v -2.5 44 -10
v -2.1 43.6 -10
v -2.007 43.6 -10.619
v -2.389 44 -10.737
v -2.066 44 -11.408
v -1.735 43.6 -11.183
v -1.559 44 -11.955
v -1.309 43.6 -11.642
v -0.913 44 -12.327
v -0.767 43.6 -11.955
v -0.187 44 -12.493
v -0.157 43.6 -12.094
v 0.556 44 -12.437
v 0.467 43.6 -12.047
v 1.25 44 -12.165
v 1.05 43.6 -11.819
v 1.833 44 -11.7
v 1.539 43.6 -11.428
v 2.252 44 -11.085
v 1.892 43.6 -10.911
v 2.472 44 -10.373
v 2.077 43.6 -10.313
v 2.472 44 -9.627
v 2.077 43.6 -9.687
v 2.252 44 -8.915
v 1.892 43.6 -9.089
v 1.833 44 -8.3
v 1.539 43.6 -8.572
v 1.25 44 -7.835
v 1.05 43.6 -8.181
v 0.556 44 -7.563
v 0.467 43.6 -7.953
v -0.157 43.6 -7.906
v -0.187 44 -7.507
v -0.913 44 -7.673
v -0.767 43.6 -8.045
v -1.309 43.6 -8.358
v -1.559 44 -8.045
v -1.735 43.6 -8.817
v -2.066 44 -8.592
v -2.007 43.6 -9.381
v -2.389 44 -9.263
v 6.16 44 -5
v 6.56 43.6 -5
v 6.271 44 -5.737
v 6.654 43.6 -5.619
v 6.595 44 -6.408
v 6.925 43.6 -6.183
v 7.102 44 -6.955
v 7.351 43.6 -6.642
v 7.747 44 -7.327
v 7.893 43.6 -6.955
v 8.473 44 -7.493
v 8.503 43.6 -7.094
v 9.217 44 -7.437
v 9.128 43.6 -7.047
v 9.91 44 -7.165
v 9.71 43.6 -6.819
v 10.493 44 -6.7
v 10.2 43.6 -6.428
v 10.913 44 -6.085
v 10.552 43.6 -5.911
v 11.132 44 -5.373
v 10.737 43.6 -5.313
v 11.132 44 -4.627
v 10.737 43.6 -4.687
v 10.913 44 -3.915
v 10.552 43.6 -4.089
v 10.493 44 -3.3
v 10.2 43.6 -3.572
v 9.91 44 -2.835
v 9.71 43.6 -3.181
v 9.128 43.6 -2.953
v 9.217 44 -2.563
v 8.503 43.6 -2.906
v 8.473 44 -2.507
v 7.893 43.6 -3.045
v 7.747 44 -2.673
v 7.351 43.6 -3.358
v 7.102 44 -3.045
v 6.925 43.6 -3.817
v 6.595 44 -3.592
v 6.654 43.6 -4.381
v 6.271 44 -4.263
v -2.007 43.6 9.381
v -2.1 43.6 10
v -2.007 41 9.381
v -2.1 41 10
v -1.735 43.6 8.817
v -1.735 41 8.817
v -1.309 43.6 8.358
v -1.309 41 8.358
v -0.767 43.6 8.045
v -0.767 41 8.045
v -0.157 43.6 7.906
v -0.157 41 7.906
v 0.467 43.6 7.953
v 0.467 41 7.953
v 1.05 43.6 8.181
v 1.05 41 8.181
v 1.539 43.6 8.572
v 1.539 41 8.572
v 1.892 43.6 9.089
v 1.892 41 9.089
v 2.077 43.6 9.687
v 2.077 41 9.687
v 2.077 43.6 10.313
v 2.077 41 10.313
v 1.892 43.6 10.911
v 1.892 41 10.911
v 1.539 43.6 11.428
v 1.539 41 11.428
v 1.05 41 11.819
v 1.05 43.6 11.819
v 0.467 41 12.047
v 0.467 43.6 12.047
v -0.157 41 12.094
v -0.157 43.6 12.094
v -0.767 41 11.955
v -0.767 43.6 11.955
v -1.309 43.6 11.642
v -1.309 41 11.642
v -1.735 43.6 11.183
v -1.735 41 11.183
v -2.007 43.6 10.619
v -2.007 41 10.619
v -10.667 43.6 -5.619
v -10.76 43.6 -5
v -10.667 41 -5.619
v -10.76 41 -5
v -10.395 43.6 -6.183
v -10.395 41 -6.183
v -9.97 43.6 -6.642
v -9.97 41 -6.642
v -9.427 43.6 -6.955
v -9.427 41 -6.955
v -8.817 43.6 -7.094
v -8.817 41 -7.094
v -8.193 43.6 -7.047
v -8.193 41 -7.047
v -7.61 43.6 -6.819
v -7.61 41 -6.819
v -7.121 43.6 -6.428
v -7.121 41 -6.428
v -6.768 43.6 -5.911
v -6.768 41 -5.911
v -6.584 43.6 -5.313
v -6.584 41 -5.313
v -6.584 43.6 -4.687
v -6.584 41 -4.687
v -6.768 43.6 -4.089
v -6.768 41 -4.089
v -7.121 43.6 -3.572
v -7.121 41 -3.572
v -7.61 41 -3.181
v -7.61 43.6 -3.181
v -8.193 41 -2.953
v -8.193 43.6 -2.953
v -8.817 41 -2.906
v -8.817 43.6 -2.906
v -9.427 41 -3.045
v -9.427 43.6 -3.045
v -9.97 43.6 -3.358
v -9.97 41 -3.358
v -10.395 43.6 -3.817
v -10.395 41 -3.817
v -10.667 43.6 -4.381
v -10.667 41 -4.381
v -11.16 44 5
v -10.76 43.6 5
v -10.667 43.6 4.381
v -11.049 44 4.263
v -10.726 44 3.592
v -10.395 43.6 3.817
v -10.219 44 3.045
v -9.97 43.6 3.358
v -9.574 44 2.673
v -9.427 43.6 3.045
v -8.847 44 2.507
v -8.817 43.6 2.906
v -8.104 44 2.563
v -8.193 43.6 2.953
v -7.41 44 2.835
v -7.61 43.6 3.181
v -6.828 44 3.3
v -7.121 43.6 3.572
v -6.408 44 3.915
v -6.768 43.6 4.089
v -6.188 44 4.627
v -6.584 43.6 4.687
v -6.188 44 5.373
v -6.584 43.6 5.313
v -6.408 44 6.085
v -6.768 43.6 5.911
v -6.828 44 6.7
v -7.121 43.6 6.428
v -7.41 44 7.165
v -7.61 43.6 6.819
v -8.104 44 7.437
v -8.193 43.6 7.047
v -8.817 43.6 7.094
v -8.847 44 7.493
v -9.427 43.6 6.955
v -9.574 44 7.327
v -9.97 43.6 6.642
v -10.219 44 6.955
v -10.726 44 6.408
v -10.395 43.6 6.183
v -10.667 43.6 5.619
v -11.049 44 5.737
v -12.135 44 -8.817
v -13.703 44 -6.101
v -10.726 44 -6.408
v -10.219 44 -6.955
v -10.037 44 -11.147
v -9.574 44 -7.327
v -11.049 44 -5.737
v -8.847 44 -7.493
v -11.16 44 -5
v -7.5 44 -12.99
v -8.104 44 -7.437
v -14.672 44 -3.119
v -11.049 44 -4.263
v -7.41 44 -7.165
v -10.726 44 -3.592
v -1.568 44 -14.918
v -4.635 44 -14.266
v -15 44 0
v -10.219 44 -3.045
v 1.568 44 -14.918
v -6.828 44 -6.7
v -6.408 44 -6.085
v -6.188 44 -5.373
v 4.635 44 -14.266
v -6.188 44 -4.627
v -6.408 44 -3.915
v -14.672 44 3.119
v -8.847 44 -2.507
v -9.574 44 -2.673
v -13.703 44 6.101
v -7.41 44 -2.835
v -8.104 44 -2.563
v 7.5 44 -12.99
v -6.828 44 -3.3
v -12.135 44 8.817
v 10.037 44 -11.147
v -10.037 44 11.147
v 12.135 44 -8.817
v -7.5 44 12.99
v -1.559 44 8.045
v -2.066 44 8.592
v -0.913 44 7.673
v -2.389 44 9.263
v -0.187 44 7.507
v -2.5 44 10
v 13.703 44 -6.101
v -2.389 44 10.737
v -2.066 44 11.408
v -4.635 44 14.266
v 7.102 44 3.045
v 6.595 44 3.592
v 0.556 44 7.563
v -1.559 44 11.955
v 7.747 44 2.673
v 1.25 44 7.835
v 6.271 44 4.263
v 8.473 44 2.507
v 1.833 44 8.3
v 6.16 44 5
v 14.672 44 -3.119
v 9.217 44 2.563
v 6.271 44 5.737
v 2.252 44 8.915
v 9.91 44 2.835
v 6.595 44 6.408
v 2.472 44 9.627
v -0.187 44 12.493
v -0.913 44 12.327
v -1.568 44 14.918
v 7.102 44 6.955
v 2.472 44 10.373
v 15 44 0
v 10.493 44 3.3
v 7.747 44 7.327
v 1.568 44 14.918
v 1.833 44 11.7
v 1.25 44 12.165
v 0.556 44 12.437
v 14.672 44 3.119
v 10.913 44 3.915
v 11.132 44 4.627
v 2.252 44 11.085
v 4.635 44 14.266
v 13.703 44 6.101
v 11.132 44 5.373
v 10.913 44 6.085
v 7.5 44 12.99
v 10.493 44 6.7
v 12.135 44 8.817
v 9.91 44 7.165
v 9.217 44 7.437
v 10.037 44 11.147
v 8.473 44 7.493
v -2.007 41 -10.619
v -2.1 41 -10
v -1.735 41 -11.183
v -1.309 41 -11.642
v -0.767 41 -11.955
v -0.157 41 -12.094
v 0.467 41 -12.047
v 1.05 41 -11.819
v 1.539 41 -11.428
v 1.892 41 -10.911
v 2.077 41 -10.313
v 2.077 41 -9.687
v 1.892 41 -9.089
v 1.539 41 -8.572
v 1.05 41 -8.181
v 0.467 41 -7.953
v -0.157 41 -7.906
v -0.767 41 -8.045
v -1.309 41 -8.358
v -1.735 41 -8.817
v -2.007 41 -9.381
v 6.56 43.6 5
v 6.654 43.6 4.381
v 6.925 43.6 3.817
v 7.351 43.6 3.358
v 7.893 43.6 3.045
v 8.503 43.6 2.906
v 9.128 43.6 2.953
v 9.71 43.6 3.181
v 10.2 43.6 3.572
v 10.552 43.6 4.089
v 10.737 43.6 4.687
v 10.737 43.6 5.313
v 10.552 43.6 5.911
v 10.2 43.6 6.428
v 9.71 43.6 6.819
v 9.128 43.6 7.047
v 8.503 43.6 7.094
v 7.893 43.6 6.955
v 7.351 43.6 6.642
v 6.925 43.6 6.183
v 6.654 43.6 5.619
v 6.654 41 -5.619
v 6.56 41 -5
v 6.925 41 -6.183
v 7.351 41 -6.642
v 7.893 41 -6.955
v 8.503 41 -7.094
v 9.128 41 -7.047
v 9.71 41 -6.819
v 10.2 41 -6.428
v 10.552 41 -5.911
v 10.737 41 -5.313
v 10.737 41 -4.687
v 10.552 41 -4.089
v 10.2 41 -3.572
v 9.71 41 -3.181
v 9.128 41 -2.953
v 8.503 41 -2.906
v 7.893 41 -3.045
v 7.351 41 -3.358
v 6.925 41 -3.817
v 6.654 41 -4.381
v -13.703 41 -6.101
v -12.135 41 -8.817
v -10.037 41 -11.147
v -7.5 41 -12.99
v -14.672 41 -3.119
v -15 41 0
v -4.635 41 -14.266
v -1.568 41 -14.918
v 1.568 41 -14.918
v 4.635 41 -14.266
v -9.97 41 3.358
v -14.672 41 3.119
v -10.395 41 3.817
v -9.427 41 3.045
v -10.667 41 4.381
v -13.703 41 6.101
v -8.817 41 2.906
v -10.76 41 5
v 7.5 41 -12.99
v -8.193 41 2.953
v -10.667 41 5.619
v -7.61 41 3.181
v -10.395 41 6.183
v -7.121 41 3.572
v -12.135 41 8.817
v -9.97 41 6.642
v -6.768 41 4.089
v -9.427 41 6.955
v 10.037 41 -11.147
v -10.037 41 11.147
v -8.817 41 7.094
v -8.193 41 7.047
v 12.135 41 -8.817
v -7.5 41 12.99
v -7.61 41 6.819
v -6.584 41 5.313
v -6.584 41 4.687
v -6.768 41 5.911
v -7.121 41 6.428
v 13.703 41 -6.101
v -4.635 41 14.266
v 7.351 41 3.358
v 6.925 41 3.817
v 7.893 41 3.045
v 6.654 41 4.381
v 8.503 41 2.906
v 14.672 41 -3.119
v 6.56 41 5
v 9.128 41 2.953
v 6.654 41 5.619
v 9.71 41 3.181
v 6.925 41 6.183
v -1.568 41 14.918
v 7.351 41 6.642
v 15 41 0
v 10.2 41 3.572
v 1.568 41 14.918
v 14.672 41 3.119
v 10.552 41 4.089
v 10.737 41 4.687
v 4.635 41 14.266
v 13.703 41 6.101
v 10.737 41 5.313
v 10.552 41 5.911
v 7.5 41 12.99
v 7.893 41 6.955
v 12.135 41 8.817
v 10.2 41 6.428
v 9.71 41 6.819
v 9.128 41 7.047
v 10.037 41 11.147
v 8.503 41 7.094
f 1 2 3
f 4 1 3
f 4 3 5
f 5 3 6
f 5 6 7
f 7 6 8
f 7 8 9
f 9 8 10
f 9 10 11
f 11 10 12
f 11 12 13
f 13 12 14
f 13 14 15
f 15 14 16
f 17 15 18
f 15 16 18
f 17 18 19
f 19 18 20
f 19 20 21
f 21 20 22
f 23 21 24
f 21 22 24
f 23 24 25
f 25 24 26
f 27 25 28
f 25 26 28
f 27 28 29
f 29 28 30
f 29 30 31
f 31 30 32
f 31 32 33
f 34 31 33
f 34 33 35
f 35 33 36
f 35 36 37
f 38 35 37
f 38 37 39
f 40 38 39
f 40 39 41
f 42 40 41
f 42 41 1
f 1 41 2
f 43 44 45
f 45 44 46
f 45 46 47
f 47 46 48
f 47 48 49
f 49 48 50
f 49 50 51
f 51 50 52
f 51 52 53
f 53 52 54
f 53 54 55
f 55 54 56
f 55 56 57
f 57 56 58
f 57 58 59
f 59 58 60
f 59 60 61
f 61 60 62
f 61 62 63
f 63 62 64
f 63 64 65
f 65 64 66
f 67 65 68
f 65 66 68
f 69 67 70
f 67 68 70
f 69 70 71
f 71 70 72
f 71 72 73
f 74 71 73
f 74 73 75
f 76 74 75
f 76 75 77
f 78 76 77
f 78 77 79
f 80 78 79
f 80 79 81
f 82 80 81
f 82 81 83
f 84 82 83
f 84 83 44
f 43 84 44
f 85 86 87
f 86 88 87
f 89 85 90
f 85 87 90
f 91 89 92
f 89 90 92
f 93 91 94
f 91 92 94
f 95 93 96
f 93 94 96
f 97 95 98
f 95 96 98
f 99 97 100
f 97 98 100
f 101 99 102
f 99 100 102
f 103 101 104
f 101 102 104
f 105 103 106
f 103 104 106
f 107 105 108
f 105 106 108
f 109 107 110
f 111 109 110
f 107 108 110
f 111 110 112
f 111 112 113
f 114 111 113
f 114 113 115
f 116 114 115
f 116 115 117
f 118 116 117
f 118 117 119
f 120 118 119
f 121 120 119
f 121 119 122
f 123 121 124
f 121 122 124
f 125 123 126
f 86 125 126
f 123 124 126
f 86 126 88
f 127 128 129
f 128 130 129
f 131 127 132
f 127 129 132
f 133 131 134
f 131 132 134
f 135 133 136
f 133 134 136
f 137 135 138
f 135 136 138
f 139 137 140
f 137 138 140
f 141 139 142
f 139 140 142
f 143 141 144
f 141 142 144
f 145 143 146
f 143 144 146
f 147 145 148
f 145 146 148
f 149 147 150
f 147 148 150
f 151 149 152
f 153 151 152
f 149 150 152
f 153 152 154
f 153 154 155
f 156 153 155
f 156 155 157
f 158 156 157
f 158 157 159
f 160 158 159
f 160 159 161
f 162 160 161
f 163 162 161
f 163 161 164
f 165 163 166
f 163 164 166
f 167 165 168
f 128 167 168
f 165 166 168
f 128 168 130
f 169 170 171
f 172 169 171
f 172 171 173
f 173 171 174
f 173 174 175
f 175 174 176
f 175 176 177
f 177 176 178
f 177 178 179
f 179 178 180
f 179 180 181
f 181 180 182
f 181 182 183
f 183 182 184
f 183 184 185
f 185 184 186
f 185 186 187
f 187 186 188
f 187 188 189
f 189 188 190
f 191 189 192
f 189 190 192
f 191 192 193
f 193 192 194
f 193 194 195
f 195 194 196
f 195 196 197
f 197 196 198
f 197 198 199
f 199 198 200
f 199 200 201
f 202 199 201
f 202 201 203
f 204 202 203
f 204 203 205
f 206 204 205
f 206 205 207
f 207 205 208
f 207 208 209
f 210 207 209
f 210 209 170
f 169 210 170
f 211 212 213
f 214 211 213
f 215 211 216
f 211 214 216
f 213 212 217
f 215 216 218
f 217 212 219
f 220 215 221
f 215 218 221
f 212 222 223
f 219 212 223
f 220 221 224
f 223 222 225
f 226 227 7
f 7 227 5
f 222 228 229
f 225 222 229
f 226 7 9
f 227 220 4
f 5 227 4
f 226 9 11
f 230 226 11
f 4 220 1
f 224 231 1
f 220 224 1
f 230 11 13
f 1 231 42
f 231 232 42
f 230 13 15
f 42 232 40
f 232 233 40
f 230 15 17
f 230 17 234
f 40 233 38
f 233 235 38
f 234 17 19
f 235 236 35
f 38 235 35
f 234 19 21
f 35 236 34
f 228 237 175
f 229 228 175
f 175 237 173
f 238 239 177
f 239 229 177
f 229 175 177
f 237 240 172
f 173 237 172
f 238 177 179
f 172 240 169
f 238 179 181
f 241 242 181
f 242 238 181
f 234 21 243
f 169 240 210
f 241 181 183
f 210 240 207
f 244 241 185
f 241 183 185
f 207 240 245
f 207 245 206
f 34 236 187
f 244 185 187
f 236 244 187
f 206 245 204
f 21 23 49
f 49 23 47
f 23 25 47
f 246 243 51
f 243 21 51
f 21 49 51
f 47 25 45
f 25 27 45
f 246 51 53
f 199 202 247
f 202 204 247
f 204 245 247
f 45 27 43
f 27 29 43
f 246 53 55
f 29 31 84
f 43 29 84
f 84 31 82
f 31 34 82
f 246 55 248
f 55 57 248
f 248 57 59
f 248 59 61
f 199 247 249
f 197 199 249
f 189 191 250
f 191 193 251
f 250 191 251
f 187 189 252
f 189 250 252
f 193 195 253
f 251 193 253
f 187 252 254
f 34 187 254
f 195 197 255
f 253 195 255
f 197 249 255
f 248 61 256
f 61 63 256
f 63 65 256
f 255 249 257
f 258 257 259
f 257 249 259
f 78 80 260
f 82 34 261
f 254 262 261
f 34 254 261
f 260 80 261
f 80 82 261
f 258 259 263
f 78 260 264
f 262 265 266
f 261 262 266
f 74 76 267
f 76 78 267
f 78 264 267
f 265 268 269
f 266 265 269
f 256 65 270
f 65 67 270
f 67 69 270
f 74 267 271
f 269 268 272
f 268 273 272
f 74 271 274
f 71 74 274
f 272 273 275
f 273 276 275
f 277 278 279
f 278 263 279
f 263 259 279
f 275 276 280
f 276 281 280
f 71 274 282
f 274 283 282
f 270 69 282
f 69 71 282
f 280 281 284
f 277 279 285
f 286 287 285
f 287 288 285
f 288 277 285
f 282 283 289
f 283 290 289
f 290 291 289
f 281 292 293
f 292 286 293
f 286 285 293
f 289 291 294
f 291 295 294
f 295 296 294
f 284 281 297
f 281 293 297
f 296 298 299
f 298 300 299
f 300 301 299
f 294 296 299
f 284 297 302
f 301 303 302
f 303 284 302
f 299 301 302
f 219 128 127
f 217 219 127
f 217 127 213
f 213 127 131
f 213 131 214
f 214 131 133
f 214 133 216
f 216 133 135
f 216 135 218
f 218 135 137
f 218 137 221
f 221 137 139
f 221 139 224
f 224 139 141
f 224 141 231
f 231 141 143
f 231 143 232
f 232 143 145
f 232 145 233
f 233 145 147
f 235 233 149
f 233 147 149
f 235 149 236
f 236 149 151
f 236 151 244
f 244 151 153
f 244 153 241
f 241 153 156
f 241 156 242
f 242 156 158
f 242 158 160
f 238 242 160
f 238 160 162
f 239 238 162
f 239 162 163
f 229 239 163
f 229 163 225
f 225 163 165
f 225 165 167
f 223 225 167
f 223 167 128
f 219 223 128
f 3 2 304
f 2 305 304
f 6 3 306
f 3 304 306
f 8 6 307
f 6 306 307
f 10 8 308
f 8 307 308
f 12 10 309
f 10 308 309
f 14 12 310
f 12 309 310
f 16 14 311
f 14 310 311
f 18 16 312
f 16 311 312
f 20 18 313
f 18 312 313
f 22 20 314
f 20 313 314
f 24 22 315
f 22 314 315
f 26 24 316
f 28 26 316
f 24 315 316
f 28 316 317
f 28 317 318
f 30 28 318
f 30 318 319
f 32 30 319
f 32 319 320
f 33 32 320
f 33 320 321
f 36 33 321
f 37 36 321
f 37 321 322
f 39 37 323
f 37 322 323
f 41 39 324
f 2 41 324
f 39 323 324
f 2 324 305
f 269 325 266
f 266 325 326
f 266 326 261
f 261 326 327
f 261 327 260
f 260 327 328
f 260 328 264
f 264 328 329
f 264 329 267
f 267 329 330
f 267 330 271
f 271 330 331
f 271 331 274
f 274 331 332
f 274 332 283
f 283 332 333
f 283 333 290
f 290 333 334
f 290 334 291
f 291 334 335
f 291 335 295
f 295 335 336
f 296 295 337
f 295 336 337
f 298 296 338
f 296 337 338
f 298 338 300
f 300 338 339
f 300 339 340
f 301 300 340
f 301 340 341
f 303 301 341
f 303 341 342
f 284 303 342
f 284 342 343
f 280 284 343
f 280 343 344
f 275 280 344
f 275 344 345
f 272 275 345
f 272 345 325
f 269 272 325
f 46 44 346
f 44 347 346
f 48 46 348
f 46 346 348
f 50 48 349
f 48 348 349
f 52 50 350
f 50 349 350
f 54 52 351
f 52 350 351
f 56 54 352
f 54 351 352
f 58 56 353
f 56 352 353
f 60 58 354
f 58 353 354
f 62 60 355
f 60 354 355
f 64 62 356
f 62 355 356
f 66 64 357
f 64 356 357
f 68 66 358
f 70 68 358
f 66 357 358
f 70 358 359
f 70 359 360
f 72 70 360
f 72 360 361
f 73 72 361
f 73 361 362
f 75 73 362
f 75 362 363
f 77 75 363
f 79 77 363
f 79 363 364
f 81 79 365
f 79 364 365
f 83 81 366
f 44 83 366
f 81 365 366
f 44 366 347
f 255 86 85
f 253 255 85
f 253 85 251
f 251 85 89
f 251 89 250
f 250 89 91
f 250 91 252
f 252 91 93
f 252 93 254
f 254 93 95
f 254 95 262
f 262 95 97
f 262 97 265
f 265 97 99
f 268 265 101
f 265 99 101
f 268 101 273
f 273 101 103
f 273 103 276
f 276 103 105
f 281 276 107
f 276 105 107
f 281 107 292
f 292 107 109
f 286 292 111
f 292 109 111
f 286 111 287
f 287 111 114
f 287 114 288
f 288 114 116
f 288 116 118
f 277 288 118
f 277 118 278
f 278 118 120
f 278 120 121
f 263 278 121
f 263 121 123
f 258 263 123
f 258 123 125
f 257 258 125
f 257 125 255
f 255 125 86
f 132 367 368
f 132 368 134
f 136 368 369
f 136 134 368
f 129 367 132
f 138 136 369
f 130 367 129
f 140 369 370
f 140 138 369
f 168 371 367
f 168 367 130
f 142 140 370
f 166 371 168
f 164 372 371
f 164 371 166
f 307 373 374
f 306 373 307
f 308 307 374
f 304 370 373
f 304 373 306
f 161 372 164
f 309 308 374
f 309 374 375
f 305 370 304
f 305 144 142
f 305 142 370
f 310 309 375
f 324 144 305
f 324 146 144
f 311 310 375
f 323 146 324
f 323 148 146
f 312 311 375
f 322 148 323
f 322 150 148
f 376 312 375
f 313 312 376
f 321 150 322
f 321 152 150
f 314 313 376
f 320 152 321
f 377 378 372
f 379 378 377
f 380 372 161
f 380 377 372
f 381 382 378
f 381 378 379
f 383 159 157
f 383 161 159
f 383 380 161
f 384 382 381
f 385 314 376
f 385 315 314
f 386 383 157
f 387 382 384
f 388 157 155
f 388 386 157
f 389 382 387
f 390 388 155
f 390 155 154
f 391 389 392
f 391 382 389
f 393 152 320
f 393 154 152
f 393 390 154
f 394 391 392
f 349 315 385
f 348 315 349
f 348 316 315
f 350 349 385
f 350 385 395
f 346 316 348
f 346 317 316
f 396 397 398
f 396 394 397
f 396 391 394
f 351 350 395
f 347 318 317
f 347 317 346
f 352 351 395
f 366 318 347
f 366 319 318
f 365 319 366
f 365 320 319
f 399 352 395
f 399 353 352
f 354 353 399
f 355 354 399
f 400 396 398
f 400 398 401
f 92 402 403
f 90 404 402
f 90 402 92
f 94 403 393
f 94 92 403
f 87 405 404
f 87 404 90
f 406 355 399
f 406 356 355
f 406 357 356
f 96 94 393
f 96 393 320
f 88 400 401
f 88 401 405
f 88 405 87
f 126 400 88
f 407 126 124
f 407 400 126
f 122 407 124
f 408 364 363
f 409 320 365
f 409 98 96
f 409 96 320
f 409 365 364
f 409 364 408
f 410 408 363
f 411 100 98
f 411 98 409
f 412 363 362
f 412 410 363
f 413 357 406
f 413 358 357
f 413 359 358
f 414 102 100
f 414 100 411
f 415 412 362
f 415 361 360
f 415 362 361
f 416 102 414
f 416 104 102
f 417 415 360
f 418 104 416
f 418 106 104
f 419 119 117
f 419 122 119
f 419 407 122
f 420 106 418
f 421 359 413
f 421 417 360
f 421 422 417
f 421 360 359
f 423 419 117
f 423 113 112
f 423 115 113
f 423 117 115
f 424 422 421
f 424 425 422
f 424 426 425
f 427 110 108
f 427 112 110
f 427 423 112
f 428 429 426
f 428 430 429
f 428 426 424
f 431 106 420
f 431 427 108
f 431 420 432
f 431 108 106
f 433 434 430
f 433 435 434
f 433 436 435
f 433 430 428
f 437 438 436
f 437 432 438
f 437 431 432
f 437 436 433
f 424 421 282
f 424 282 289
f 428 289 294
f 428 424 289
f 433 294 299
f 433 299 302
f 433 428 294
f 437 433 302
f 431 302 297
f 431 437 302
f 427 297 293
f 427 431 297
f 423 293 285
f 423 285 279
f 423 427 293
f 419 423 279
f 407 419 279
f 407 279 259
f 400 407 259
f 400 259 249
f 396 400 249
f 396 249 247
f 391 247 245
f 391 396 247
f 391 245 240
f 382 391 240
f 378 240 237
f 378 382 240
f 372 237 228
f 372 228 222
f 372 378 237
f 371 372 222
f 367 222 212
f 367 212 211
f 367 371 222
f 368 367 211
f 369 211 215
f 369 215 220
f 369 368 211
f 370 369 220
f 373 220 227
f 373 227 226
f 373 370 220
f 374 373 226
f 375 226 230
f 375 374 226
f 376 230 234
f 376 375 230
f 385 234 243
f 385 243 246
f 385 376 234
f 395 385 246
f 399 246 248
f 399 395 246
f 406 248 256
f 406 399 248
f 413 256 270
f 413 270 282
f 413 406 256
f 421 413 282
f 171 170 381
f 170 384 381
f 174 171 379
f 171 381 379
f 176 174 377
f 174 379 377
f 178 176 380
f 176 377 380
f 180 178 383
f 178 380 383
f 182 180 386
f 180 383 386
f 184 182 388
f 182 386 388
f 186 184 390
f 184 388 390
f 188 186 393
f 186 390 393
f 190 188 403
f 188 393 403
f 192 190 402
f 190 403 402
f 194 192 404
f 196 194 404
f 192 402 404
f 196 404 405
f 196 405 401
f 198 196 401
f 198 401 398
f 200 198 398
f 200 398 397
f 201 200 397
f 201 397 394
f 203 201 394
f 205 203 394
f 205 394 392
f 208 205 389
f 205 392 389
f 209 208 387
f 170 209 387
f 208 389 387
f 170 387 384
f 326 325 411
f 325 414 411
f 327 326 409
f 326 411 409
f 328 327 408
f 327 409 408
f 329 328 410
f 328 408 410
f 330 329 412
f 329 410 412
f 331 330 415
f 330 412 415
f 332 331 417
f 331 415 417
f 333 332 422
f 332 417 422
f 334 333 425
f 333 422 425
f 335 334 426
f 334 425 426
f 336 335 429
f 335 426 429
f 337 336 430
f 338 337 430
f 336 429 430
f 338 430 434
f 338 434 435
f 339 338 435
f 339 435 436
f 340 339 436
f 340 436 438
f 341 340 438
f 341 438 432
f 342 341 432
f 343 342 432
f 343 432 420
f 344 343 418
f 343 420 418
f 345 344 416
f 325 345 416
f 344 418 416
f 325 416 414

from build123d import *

# Parameters (mm, degrees)
SKETCH_1_R                  = 15
EXTRUDE_1_DEPTH             = 3
HOLE_WIZARD_M41_D           = 4.2
HOLE_WIZARD_M41_CSINK_D     = 5
HOLE_WIZARD_M41_CSINK_ANGLE = 90


with BuildPart() as part:
    # Эскиз1 → Бобышка-Вытянуть1 (new body)
    with BuildSketch(Plane.XZ.offset(-41)):
        Circle(SKETCH_1_R)
    extrude(amount=-EXTRUDE_1_DEPTH)

    # Сверло под метчик  спиральное M41 (through all)
    with Locations(Plane(origin=(0, 44, 0), x_dir=(1, 0, 0), z_dir=(0, 1, 0))):
        with Locations((-8.660254038, 5), (0, 10), (8.660254038, 5), (8.660254038, -5), (0, -10), (-8.660254038, -5)):
            CounterSinkHole(HOLE_WIZARD_M41_D / 2, HOLE_WIZARD_M41_CSINK_D / 2, counter_sink_angle=HOLE_WIZARD_M41_CSINK_ANGLE)


solid = part.part
